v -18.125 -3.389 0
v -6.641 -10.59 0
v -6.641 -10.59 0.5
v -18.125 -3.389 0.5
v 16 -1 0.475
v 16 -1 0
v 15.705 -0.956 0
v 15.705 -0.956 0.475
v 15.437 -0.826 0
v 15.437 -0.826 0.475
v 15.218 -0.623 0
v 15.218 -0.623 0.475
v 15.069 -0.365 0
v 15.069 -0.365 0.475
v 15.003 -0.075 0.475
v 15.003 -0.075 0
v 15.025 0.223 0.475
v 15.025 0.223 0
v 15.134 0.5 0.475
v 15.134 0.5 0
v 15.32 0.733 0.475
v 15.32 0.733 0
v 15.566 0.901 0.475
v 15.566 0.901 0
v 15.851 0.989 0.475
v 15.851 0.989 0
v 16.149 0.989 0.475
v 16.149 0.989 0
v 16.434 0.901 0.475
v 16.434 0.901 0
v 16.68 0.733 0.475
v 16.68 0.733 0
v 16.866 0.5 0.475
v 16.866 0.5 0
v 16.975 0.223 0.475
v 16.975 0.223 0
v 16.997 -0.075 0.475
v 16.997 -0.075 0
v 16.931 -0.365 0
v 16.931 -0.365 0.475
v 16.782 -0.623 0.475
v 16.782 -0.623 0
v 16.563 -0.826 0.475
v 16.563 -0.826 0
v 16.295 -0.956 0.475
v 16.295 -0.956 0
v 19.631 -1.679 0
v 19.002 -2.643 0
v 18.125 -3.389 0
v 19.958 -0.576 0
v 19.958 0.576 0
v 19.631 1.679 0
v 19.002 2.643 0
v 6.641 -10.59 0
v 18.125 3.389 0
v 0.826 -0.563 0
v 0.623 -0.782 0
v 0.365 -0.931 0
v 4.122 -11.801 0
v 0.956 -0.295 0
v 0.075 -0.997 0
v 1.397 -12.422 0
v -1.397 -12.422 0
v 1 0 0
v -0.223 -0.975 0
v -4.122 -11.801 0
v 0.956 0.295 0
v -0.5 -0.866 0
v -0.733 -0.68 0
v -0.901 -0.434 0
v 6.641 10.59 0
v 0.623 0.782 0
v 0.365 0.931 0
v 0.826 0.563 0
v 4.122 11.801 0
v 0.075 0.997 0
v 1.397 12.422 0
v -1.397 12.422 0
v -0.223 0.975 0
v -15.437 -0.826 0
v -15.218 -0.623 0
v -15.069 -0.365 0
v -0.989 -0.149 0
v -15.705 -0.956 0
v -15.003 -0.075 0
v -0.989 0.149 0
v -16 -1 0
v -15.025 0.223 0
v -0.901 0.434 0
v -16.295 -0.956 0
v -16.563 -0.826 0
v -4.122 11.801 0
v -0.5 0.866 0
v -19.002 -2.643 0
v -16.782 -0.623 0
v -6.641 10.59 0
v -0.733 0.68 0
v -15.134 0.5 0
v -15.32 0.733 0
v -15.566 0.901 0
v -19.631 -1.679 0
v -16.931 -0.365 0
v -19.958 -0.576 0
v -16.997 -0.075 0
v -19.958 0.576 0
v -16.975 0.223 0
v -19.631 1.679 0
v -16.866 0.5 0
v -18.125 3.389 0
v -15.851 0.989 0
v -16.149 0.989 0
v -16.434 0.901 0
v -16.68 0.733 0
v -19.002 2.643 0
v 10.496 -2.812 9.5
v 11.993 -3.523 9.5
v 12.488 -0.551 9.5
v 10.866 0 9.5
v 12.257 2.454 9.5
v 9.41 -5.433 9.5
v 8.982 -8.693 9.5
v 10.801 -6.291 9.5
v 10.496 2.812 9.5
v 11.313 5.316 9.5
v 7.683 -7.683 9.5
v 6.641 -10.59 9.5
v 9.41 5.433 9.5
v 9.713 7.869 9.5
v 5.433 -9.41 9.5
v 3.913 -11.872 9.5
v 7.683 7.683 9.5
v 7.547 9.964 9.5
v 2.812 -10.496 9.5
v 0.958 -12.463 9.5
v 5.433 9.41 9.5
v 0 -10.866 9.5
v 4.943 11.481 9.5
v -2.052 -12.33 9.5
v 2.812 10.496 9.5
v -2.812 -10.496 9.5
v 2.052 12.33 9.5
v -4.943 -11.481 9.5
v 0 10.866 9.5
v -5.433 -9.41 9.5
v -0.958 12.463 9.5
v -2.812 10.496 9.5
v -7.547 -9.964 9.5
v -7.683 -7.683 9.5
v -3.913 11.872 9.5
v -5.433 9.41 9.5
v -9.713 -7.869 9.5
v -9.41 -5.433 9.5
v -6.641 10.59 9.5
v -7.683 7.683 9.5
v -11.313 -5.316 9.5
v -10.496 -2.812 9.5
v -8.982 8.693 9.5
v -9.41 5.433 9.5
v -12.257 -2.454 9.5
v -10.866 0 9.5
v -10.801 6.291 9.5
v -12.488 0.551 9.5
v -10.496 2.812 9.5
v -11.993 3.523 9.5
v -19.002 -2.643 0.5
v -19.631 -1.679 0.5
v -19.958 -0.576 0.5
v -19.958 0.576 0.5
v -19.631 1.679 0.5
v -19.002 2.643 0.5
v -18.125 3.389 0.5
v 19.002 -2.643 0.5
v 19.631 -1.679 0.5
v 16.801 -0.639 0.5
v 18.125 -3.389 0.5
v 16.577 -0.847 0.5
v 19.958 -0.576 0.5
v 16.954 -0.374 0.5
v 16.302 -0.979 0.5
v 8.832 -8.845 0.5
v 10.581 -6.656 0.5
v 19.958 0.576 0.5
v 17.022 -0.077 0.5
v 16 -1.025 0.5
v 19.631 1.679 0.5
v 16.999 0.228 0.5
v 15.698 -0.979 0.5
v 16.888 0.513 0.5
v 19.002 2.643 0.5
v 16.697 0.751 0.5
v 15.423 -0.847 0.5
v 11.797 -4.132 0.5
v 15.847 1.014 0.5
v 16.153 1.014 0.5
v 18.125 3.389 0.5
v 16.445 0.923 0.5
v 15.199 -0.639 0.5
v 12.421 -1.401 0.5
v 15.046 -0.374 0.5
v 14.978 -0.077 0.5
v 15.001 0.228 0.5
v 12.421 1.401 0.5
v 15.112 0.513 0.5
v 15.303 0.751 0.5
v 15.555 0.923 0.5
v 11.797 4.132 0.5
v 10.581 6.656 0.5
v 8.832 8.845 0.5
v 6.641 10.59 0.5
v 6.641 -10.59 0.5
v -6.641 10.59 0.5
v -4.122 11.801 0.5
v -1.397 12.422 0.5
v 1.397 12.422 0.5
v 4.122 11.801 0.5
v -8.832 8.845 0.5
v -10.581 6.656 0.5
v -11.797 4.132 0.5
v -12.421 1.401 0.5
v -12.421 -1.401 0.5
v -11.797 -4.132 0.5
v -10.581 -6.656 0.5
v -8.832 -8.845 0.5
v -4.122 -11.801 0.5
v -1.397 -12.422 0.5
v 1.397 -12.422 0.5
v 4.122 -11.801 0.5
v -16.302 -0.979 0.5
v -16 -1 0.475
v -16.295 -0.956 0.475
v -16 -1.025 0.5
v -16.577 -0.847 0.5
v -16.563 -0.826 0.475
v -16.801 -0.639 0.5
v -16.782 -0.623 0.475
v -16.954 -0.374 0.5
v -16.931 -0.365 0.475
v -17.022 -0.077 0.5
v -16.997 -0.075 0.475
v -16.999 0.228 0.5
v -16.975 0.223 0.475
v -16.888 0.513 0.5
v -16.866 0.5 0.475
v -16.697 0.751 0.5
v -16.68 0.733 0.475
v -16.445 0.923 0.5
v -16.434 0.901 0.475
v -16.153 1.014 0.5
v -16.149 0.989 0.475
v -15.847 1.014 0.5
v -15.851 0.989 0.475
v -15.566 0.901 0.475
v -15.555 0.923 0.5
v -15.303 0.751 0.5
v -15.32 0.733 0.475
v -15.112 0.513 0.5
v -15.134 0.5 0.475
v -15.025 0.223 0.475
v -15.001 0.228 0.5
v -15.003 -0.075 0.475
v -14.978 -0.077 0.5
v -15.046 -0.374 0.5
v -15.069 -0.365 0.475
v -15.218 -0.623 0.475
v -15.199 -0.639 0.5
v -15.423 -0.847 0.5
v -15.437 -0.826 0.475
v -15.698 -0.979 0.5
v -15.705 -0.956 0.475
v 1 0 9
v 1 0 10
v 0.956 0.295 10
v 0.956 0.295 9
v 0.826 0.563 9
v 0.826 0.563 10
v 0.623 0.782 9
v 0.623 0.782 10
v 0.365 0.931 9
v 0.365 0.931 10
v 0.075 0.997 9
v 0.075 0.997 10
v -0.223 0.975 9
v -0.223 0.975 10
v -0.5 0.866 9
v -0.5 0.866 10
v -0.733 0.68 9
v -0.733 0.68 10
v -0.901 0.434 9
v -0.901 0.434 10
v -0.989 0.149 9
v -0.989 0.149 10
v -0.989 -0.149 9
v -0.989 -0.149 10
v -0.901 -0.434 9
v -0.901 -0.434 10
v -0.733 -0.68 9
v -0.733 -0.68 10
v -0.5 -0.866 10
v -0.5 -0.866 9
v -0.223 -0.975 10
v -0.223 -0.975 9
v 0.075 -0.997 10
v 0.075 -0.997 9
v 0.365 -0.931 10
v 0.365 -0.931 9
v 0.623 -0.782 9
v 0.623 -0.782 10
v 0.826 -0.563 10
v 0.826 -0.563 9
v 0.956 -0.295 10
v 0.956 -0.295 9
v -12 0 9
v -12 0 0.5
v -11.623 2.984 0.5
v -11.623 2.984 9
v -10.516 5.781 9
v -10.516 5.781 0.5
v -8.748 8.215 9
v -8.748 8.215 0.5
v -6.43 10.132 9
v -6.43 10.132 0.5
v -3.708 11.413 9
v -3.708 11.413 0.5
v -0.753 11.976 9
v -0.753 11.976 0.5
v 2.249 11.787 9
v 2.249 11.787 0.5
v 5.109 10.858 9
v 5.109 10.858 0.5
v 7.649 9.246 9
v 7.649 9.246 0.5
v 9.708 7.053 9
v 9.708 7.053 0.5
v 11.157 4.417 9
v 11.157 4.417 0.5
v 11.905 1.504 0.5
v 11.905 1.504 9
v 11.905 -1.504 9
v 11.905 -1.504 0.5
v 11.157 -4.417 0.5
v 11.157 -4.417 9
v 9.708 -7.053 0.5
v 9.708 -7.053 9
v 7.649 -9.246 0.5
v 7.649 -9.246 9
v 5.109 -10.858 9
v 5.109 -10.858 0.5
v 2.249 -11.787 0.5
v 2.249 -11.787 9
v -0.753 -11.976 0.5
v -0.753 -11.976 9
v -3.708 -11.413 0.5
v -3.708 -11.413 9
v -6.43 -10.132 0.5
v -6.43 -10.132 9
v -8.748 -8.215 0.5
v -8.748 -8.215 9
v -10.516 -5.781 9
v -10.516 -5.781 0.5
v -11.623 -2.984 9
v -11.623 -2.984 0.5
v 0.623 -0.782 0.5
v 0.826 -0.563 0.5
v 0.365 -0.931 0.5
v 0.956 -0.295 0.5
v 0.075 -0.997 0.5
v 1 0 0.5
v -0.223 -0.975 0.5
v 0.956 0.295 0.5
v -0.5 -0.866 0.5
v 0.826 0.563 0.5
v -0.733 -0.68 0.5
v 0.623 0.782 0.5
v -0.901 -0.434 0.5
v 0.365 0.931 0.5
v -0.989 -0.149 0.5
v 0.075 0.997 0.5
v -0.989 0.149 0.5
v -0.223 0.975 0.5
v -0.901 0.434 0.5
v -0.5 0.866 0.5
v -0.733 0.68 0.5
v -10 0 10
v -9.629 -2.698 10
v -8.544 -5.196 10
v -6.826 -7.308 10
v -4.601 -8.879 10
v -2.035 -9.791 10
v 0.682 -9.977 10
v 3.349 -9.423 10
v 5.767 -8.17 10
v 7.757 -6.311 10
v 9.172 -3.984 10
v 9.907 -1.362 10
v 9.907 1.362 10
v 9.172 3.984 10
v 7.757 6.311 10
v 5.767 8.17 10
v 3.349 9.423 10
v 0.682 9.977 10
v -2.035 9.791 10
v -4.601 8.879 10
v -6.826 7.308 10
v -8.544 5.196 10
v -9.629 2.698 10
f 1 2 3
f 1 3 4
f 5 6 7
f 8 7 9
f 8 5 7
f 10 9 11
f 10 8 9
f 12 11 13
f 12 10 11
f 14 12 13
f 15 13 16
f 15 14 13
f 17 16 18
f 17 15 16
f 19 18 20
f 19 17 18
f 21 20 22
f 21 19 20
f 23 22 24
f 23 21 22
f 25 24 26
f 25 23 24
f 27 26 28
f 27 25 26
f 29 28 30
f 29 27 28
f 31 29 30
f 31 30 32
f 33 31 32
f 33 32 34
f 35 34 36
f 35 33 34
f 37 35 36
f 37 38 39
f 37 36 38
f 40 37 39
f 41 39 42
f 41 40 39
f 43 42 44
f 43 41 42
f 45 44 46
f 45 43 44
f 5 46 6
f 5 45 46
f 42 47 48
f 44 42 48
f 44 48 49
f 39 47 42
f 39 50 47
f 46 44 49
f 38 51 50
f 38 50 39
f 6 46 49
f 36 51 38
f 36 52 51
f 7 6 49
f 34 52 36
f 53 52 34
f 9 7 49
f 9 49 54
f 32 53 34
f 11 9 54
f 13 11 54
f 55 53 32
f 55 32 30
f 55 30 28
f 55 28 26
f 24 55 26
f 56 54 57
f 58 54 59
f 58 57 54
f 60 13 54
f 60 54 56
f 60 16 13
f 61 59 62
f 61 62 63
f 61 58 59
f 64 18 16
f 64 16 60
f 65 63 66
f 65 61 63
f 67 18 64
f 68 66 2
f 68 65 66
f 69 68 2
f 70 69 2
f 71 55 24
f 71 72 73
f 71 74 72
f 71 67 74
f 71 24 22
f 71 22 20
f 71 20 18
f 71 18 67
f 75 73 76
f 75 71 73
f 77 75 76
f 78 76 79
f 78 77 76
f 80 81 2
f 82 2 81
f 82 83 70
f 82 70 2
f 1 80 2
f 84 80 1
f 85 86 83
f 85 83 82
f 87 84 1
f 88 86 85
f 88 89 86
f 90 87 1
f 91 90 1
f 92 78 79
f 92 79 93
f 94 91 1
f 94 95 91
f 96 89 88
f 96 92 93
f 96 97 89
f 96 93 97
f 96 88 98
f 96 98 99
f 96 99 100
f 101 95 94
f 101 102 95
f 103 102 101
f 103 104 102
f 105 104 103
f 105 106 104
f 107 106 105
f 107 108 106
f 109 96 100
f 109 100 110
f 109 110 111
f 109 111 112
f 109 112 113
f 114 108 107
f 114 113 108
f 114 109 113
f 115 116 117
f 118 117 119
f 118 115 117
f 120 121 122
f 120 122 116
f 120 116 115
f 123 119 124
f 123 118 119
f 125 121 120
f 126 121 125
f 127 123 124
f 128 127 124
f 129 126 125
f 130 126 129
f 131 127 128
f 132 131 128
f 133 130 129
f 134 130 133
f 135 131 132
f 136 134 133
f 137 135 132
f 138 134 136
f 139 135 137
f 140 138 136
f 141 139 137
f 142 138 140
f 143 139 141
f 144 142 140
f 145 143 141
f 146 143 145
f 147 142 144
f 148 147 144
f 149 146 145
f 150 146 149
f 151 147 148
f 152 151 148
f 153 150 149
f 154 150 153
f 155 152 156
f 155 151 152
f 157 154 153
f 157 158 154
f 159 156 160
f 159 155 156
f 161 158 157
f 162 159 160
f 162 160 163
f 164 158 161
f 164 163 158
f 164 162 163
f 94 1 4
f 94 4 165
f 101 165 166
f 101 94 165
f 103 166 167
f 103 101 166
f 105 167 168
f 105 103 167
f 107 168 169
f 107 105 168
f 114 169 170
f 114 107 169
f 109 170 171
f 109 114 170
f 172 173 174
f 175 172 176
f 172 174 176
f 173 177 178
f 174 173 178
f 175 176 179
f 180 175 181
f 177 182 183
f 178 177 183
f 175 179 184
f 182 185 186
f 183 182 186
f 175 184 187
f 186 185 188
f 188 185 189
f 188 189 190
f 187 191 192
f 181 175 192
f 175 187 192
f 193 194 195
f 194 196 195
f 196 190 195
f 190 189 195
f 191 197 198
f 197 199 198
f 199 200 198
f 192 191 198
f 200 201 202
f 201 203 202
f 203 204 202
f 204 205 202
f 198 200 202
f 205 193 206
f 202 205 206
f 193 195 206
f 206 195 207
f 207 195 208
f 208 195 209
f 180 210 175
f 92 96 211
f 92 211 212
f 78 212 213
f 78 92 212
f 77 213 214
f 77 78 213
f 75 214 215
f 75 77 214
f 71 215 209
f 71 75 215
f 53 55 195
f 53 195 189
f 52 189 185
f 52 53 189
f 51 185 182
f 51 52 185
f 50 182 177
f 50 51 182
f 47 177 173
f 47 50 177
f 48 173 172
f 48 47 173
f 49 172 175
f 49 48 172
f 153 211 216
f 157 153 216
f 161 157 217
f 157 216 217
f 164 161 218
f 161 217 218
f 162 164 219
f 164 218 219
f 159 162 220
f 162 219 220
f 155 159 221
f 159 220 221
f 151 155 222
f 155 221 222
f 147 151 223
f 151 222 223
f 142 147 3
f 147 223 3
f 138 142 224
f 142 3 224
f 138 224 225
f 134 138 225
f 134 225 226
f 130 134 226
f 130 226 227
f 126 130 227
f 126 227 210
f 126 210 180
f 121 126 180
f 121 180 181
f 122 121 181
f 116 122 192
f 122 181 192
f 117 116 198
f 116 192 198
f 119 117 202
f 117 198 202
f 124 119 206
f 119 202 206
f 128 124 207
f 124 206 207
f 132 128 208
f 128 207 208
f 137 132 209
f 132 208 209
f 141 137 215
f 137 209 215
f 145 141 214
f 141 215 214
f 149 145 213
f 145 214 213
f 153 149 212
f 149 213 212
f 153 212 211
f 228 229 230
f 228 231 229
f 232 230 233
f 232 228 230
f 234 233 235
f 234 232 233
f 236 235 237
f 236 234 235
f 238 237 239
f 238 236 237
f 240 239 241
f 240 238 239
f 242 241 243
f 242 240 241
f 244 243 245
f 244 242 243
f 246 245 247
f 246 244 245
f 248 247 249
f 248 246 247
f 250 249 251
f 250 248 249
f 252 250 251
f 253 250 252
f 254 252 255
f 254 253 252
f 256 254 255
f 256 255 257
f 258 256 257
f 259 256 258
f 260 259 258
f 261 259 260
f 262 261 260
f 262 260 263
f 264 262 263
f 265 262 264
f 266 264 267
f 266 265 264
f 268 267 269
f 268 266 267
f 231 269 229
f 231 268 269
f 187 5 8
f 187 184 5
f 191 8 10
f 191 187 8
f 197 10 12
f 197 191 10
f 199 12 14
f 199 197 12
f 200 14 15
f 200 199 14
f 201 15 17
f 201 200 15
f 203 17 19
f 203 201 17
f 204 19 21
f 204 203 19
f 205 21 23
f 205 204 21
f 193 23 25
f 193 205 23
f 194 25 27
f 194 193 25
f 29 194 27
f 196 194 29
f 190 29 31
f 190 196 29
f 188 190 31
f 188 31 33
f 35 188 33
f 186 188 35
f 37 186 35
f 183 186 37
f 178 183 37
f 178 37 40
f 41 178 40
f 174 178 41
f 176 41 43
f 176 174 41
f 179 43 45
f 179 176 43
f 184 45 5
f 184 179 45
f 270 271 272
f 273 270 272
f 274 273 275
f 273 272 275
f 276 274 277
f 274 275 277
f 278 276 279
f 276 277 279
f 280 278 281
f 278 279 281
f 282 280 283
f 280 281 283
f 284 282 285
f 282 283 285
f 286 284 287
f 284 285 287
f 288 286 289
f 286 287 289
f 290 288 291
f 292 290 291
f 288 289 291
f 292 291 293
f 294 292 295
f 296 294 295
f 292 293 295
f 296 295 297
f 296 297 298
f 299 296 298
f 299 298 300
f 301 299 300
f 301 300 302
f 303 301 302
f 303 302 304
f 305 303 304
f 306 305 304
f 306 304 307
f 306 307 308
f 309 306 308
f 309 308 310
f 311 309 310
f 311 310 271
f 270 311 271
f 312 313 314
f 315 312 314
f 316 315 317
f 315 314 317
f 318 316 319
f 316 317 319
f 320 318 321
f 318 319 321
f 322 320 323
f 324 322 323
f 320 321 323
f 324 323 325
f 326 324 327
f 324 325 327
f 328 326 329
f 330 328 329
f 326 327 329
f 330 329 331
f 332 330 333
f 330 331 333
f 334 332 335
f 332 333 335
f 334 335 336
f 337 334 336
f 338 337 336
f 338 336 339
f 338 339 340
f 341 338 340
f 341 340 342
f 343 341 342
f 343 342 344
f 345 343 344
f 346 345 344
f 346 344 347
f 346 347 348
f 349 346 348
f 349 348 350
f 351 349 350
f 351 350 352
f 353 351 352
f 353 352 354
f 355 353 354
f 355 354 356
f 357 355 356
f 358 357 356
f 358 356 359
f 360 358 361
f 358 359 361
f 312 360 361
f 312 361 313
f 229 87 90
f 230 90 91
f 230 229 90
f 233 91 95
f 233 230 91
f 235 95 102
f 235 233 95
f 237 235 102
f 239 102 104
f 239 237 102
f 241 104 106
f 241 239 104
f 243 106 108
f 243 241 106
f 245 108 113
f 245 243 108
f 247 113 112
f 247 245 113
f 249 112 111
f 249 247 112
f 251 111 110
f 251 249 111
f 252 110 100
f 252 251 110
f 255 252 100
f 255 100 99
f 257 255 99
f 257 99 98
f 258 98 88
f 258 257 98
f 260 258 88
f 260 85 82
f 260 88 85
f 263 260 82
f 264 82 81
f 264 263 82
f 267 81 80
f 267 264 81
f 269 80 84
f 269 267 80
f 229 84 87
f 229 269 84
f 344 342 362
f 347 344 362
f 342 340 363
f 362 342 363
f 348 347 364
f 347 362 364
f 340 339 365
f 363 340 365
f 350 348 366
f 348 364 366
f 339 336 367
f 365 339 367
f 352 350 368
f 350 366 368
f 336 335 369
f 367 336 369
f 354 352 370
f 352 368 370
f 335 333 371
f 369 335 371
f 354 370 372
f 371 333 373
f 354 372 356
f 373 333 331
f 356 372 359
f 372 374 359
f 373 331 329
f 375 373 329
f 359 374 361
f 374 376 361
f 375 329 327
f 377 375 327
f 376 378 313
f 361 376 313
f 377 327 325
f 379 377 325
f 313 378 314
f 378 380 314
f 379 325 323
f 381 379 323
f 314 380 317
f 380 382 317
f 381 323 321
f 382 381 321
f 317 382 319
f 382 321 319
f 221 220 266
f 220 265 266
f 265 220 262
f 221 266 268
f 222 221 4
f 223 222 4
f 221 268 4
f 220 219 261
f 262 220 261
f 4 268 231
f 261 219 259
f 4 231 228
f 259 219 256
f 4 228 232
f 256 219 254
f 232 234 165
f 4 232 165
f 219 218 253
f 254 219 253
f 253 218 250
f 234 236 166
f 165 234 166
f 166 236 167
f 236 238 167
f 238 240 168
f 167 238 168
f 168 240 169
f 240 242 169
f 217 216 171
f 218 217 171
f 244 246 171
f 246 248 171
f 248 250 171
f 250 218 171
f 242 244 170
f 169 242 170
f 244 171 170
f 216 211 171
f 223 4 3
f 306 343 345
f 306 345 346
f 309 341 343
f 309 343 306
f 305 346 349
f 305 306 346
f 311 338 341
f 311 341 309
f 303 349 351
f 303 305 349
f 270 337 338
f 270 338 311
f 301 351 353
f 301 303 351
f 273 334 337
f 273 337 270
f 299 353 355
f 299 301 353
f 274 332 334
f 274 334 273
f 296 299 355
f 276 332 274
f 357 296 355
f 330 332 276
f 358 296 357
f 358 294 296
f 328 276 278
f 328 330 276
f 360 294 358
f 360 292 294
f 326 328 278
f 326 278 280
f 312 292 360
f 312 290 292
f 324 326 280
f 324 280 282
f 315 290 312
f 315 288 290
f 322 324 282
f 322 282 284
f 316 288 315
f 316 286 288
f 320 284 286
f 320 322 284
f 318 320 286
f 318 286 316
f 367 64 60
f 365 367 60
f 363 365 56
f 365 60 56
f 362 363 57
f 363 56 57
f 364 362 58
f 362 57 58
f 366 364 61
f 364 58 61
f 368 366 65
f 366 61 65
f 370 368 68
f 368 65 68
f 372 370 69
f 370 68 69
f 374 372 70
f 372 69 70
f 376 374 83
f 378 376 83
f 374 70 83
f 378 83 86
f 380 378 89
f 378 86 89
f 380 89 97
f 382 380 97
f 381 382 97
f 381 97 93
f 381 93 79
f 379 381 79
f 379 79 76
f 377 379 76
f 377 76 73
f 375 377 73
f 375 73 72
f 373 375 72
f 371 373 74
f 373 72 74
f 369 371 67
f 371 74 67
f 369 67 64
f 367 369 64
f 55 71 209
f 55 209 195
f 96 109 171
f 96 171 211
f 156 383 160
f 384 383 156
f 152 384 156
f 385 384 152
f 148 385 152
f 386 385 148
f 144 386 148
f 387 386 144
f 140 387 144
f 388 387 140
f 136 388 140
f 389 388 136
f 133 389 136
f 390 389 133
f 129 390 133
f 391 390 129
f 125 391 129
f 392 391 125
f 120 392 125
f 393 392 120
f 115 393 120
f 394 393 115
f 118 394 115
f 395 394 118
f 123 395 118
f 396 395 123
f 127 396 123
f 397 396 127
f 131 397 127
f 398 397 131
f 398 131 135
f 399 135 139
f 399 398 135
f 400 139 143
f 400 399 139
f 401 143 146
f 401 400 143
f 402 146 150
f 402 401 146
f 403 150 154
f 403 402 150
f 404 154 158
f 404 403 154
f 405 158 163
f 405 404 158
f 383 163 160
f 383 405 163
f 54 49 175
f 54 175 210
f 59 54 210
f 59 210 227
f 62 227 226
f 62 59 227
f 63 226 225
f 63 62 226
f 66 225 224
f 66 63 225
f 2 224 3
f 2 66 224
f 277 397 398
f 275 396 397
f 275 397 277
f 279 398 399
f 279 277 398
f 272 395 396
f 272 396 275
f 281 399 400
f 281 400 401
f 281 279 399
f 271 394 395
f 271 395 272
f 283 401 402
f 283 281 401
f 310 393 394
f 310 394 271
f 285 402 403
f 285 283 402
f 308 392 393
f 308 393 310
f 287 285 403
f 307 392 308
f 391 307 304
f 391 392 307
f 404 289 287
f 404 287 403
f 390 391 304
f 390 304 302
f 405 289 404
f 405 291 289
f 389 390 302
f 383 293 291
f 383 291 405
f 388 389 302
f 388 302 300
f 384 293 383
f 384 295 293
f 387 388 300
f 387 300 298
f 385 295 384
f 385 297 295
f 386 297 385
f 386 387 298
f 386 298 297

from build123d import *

# Parameters (mm, degrees)
BOSS_EXTRU_1_DEPTH         = 0.5
ESQUISSE2_R                = 12.5
BOSS_EXTRU_2_DEPTH         = 9
ESQUISSE4_R                = 1
ENL_V_MAT_EXTRU_1_DEPTH    = 26.617376915
TROU_TARAUD_M21_AT_2_COUNT = 2
TROU_TARAUD_M21_AT_2_PITCH = 32
ESQUISSE7_R                = 12
ENL_V_MAT_EXTRU_2_DEPTH    = 9
ESQUISSE8_R                = 12
ESQUISSE8_R_2              = 1
BOSS_EXTRU_3_DEPTH         = 0.5


with BuildPart() as part:
    # Esquisse1 → Boss.-Extru.1 (new body)
    with BuildSketch(Plane.XY):
        with BuildLine():
            Line((-18.125, 3.388860428), (-6.640625, 10.590188837))
            ThreePointArc((-6.640625, 10.590188837), (0, 12.5), (6.640625, 10.590188837))
            Line((6.640625, 10.590188837), (18.125, 3.388860428))
            ThreePointArc((18.125, 3.388860428), (20, 0), (18.125, -3.388860428))
            Line((18.125, -3.388860428), (6.640625, -10.590188837))
            ThreePointArc((6.640625, -10.590188837), (0, -12.5), (-6.640625, -10.590188837))
            Line((-6.640625, -10.590188837), (-18.125, -3.388860428))
            ThreePointArc((-18.125, -3.388860428), (-20, 0), (-18.125, 3.388860428))
        make_face()
    extrude(amount=BOSS_EXTRU_1_DEPTH)

    # Esquisse2 → Boss.-Extru.2 (add)
    with BuildSketch(Plane.XY.offset(0.5)):
        with Locations(Location((0, 0, 0), (0, 0, 122.089951256))):
            Circle(ESQUISSE2_R)
    extrude(amount=BOSS_EXTRU_2_DEPTH)

    # Esquisse3 → Révolution1 (revolve)
    with BuildSketch(Plane(origin=(0, 0, 0), x_dir=(0, 0, -1), z_dir=(1, 0, 0)), mode=Mode.PRIVATE) as r_volution1_sk:
        Polygon((-9.5, 10.866025404), (-10, 10), (-10, 0), (-9.5, 0), align=None)
    revolve(r_volution1_sk.sketch.rotate(Axis((0, 0, 2.055193474), (0, 0, 1)), 90), axis=Axis((0, 0, 2.055193474), (0, 0, 1)))

    # Esquisse4 → Enlèv. mat.-Extru.1 (cut, through all)
    with BuildSketch(Plane.XY.offset(10)):
        Circle(ESQUISSE4_R)
    extrude(amount=-ENL_V_MAT_EXTRU_1_DEPTH, mode=Mode.SUBTRACT)

    # Esquisse6 → Trou taraudé M21 (revolve, cut)
    with BuildSketch(Plane(origin=(16, 0, 0.5), x_dir=(0, -1, 0), z_dir=(1, 0, 0))):
        Polygon((0, 0), (0, 6.480688495), (0.8, 6), (0.8, 4), (1, 4), (1, 0.025), (1.025, 0), align=None)
    trou_taraud_m21 = revolve(axis=Axis((16, 0, 6.85), (0, 0, -1)), mode=Mode.SUBTRACT)

    # Trou taraudé M21 at 2: Trou taraudé M21 ×2
    with Locations(*[(-i * TROU_TARAUD_M21_AT_2_PITCH, 0, 0) for i in range(1, TROU_TARAUD_M21_AT_2_COUNT)]):
        add(trou_taraud_m21, mode=Mode.SUBTRACT)

    # Esquisse7 → Enlèv. mat.-Extru.2 (cut)
    with BuildSketch(Plane(origin=(0, 0, 0), x_dir=(-1, 0, 0), z_dir=(0, 0, -1))):
        Circle(ESQUISSE7_R)
    extrude(amount=-ENL_V_MAT_EXTRU_2_DEPTH, mode=Mode.SUBTRACT)

    # Esquisse8 → Boss.-Extru.3 (add)
    with BuildSketch(Plane(origin=(0, 0, 0), x_dir=(-1, 0, 0), z_dir=(0, 0, -1))):
        Circle(ESQUISSE8_R)
        with Locations(Location((0, 0, 0), (0, 0, 180))):
            Circle(ESQUISSE8_R_2, mode=Mode.SUBTRACT)
    extrude(amount=-BOSS_EXTRU_3_DEPTH)


solid = part.part
